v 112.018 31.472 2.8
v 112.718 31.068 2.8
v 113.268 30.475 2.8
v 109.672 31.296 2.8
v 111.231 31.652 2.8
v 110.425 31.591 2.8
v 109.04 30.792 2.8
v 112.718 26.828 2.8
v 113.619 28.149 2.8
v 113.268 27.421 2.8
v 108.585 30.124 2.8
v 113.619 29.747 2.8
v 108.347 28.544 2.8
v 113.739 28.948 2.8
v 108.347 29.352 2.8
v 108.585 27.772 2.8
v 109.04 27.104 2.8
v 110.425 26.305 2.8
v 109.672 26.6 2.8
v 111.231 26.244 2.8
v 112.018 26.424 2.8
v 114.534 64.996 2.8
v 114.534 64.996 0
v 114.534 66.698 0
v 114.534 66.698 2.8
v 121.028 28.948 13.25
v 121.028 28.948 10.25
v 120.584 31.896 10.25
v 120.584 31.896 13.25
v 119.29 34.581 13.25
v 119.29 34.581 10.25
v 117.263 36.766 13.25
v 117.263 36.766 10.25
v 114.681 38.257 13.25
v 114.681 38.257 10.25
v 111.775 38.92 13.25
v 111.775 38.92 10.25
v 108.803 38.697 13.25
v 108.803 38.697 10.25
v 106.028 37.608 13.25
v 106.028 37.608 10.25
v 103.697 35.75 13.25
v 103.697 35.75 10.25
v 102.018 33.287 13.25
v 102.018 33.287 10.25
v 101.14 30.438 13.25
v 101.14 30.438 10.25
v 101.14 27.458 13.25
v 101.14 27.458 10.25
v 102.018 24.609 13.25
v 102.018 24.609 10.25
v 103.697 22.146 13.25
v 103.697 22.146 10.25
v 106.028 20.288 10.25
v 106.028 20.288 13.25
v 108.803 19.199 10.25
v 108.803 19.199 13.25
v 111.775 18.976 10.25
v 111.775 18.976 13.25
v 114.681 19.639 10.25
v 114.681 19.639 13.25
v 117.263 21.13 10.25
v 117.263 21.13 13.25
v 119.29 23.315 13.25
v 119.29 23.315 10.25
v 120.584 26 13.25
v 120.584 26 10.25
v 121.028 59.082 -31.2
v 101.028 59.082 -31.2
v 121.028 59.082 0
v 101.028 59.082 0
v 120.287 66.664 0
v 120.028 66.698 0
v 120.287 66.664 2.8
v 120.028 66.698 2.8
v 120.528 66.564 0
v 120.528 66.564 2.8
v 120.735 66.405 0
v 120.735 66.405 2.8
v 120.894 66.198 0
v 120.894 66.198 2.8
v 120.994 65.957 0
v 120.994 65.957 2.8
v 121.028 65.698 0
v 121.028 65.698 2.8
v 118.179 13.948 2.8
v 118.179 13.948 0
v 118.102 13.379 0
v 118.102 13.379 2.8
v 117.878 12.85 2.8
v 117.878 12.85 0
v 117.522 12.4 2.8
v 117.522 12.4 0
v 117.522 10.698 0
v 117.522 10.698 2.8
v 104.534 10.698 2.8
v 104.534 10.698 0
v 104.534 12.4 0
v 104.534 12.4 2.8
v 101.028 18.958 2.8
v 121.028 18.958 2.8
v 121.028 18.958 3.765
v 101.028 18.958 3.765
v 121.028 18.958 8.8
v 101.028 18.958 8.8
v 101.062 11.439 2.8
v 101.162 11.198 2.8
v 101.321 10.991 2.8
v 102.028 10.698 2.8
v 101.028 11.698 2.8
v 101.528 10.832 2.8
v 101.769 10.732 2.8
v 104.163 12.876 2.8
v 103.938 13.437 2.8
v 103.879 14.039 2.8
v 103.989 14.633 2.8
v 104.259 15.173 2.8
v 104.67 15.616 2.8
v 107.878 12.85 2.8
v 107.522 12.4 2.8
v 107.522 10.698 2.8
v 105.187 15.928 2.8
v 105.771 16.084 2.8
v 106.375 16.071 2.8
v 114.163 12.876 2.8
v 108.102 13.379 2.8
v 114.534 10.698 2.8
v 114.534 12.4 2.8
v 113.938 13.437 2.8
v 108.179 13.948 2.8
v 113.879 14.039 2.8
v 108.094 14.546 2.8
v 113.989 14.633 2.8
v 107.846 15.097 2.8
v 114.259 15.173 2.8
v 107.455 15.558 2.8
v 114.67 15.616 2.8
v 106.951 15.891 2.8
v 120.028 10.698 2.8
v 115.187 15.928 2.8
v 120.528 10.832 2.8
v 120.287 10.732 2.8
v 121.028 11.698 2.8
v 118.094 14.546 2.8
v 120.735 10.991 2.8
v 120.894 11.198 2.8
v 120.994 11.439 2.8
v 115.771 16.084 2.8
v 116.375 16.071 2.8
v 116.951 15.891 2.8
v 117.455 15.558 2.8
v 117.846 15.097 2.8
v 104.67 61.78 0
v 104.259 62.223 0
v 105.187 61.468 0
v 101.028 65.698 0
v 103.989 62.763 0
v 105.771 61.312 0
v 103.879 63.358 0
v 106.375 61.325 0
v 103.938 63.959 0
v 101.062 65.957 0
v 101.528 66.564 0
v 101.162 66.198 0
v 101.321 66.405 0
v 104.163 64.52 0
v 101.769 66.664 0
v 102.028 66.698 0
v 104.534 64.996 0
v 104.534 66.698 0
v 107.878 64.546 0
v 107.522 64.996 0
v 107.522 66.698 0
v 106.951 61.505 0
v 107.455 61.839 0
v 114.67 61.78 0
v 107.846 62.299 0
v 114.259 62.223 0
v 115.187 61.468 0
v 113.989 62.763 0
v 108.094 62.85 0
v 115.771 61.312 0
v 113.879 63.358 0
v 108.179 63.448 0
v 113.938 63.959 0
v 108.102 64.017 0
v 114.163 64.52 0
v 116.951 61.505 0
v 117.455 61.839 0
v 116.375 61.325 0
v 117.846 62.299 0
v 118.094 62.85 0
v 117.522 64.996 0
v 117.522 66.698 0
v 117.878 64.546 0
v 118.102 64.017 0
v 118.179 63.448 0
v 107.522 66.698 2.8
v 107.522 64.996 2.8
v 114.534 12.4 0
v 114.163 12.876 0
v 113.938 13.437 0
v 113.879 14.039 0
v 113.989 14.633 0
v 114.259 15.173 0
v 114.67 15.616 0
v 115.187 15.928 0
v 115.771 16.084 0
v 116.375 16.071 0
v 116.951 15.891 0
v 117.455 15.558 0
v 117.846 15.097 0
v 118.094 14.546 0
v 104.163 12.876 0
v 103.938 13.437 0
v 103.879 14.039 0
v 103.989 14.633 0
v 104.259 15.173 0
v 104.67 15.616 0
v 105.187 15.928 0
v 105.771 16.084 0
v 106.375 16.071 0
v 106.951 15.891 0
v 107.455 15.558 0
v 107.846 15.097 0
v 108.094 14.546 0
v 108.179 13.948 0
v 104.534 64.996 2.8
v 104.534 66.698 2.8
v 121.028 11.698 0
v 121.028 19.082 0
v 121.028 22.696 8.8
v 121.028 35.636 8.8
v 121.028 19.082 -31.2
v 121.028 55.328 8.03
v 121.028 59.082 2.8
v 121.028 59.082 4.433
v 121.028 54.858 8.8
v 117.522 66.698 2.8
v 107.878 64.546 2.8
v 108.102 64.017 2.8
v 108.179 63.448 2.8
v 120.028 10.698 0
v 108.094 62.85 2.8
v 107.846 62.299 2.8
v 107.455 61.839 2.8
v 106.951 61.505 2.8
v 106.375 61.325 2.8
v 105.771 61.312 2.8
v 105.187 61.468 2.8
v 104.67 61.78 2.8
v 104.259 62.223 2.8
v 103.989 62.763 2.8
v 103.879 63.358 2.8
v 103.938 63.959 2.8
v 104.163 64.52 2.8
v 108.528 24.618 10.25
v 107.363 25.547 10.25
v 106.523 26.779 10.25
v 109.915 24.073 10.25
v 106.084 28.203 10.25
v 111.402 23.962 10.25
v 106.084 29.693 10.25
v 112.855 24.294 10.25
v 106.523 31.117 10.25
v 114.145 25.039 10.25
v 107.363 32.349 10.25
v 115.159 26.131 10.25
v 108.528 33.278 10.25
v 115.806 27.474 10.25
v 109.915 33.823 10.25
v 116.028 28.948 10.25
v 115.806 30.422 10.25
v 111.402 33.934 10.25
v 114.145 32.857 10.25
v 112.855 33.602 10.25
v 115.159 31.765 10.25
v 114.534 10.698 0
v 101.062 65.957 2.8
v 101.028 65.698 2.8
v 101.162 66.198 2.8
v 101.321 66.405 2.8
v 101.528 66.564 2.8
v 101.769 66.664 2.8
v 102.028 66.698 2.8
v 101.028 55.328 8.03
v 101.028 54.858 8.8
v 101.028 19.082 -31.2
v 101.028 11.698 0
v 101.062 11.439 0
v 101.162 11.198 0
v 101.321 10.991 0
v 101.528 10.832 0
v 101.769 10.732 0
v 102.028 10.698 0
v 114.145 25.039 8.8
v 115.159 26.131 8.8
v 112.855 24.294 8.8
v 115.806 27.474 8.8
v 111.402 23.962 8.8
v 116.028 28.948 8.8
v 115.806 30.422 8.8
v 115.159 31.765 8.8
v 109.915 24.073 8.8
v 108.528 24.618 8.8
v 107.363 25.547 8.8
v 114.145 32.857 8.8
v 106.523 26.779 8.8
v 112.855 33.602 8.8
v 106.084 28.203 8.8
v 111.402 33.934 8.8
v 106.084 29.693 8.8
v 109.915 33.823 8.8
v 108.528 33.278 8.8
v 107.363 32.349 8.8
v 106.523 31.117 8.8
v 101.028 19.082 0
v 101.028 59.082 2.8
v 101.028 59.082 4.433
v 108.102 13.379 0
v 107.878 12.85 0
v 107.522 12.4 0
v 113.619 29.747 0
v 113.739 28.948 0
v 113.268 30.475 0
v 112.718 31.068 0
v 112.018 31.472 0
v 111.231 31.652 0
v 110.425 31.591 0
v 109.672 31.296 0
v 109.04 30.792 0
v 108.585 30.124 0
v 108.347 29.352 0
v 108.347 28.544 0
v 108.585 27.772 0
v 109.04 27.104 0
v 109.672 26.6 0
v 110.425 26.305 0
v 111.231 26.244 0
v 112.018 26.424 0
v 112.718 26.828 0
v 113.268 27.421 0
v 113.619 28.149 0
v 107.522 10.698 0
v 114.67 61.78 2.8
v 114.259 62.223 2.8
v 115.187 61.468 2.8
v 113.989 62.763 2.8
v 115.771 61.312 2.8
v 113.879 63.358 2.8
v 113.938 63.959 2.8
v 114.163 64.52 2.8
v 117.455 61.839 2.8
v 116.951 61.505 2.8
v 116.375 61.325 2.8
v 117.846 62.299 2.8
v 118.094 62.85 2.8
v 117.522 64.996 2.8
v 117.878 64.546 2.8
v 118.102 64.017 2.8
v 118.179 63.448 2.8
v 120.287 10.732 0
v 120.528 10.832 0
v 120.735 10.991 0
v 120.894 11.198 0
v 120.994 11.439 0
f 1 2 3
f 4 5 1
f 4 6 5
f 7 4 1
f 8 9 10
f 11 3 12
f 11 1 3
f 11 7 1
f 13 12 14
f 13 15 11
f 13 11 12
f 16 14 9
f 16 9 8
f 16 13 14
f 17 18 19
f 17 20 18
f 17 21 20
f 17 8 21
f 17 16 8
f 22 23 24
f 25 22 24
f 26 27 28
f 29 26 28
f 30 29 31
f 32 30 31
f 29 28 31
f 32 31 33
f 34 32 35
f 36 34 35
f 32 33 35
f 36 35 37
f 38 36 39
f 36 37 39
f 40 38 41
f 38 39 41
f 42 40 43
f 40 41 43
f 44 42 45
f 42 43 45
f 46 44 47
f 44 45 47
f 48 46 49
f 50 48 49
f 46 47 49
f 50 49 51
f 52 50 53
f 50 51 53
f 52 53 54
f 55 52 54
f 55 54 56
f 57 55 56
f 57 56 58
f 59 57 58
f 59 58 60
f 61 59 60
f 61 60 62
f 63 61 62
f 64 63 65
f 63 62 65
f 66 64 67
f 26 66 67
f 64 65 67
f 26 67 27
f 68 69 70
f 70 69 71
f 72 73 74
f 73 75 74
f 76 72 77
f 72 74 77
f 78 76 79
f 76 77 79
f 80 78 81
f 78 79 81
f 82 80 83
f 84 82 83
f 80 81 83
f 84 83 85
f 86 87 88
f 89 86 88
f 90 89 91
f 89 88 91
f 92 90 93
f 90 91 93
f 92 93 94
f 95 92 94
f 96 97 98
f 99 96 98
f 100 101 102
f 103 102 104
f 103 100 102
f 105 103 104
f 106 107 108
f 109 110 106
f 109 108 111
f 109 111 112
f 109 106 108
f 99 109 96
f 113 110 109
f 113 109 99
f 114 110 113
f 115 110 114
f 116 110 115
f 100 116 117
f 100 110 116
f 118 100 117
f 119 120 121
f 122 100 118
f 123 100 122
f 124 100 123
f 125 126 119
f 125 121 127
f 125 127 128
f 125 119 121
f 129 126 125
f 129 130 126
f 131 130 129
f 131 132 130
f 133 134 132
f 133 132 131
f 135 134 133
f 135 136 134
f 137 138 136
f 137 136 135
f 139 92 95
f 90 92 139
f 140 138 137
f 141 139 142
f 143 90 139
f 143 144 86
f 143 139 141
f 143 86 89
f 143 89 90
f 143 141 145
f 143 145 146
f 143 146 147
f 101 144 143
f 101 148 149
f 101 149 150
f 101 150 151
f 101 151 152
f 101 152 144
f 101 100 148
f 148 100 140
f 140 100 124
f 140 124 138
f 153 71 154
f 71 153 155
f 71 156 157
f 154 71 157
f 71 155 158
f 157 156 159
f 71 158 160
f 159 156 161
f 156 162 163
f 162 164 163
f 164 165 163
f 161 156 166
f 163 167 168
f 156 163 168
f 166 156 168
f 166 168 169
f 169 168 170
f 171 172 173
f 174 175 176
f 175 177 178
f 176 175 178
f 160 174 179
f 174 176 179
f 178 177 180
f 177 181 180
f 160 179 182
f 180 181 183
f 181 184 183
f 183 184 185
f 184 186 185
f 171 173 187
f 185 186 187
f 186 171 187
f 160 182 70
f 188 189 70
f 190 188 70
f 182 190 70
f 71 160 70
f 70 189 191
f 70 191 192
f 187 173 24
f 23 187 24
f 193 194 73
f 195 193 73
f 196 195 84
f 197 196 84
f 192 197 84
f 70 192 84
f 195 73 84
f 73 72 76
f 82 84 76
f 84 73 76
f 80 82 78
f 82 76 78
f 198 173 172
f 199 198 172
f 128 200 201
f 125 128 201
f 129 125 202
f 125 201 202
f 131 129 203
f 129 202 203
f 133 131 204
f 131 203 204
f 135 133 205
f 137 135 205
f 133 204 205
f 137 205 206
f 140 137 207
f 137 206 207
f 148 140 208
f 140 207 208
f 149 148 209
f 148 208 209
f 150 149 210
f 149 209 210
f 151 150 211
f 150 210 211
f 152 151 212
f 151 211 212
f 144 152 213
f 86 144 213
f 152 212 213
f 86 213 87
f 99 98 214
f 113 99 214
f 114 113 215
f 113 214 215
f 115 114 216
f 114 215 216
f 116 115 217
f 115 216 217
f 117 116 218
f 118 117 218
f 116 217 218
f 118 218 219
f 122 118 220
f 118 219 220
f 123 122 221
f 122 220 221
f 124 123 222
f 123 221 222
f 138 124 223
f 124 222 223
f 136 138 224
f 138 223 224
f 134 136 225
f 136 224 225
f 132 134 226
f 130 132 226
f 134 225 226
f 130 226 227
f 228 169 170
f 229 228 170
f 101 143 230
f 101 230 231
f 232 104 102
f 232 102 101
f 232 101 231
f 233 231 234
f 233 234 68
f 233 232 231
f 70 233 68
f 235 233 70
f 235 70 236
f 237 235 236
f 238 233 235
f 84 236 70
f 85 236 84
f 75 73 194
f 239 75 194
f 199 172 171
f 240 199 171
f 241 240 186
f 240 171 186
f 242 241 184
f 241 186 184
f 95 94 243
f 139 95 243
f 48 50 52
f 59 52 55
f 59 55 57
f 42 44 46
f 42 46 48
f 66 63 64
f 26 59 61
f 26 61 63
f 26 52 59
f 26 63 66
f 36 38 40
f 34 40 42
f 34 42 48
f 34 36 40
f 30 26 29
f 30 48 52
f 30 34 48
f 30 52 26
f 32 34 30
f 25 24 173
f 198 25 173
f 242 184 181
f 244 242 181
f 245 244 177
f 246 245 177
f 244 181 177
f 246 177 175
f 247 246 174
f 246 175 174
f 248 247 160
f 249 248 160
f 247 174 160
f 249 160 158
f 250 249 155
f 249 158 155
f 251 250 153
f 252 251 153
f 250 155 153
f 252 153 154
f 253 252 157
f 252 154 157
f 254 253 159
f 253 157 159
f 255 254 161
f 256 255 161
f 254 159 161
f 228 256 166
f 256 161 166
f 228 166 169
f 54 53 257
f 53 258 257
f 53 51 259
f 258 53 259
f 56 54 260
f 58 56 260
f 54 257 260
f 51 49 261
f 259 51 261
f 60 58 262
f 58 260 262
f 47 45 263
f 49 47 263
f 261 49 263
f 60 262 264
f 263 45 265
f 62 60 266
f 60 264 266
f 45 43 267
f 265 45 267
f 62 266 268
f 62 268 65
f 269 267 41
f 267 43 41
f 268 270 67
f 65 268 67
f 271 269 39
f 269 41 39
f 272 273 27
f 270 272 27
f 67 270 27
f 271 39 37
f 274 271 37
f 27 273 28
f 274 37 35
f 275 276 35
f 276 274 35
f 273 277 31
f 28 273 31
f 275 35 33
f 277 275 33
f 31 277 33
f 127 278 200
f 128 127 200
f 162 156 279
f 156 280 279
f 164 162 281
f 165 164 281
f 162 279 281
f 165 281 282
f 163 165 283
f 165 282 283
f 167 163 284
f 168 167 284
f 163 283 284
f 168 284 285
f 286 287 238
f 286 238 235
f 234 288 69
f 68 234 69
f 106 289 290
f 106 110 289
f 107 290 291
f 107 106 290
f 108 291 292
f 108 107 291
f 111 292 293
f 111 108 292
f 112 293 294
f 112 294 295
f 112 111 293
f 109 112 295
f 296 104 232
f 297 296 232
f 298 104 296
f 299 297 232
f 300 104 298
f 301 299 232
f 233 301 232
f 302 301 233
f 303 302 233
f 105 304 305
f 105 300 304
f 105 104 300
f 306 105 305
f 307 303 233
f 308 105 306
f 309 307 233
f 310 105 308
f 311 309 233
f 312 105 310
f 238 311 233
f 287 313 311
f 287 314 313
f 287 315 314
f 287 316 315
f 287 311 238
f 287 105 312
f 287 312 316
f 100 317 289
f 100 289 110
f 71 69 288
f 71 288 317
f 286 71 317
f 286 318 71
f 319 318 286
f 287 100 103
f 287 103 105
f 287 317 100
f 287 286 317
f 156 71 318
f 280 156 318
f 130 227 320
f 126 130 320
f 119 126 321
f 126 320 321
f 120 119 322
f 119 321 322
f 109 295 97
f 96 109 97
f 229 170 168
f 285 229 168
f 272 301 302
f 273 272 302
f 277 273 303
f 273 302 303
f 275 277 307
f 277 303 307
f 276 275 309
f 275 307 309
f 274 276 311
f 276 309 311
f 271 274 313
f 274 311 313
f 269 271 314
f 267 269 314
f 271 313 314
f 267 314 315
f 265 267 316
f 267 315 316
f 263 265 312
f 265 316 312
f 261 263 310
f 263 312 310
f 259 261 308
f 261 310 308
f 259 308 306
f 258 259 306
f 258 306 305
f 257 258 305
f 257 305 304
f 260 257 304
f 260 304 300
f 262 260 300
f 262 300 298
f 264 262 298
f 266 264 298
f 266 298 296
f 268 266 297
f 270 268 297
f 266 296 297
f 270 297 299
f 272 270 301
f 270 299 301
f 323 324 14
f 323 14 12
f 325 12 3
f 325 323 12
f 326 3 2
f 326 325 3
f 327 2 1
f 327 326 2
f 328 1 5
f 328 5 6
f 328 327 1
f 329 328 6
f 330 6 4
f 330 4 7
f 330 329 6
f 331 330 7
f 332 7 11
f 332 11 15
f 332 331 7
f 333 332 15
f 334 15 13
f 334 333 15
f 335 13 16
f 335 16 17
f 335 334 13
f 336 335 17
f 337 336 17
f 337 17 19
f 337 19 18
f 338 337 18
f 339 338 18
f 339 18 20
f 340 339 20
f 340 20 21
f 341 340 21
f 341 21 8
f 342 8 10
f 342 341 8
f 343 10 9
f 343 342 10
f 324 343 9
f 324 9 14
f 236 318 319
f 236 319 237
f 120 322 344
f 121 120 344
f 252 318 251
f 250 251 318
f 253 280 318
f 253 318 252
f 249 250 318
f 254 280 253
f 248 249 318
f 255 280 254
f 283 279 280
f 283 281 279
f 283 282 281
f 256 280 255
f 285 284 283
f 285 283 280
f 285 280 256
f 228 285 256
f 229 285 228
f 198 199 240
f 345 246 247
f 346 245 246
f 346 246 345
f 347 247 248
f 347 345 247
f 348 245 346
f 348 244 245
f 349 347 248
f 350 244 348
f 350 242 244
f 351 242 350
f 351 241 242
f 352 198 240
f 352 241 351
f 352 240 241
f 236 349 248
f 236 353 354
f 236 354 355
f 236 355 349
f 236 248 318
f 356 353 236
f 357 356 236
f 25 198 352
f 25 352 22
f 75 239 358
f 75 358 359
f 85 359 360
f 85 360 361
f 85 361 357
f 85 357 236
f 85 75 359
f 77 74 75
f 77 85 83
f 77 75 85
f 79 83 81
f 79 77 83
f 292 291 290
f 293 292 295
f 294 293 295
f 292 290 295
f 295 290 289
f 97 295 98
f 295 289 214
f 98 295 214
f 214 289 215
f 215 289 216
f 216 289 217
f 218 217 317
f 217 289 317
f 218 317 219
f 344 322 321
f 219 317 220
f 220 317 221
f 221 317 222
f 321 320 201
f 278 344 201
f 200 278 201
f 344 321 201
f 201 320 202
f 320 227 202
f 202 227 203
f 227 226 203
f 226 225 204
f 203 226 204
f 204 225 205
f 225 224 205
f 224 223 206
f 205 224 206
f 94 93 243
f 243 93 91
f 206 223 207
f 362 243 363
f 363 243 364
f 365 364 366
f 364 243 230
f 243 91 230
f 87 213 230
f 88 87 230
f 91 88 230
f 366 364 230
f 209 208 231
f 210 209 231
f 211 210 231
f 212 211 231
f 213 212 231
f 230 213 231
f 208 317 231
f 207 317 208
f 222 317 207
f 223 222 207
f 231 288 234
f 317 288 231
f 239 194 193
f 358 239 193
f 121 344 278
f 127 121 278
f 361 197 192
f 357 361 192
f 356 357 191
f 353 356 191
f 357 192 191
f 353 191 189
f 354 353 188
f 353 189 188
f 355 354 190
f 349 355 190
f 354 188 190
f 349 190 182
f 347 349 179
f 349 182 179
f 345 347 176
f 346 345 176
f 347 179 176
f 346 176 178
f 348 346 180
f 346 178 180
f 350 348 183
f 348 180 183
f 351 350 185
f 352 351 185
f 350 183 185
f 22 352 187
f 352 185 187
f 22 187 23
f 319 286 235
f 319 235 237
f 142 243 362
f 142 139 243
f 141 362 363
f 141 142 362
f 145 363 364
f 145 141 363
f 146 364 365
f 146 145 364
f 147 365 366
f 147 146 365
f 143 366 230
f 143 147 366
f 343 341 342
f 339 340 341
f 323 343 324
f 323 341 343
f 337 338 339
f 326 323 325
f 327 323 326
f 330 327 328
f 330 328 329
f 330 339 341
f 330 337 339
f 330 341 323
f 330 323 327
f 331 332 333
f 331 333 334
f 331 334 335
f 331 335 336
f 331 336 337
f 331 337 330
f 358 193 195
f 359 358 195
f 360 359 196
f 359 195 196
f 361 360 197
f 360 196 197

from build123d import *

# Parameters (mm, degrees)
SKETCH1_R           = 2.71138536
BOSS_EXTRUDE2_DEPTH = 2.8
FILLET1_R           = 1
BOSS_EXTRUDE4_REACH = 71.688
SKETCH5_W           = 31.2
SKETCH5_H           = 40
CUT_EXTRUDE1_DEPTH  = 143.310868606
SKETCH7_W           = 29.686403428
SKETCH7_H           = 9.387658688
SKETCH7_W_2         = 27.535306267
SKETCH7_H_2         = 10.174748845
CUT_EXTRUDE2_DEPTH  = 143.310868606
SKETCH9_R           = 3.527564699
BOSS_EXTRUDE5_DEPTH = 4.45
SKETCH8_W           = 7.436989159
SKETCH8_H           = 16.512703909
CUT_EXTRUDE4_DEPTH  = 77.302474202
SKETCH11_R          = 5
BOSS_EXTRUDE6_DEPTH = 1.45
SKETCH12_R          = 10
BOSS_EXTRUDE7_DEPTH = 3


with BuildPart() as part:
    # Sketch1 → Boss-Extrude2 (new body)
    with BuildSketch(Plane.XY):
        with BuildLine():
            Line((101.027913119, 66.698032725), (101.027913119, 10.698032725))
            Line((101.027913119, 10.698032725), (104.53416083, 10.698032725))
            Line((104.53416083, 10.698032725), (104.53416083, 12.400036101))
            ThreePointArc((104.53416083, 12.400036101), (105.187004527, 15.928048429), (108.179096386, 13.948032725))
            ThreePointArc((108.179096386, 13.948032725), (108.007928823, 13.107124133), (107.521665407, 12.400036101))
            Line((107.521665407, 12.400036101), (107.521665407, 10.698032725))
            Line((107.521665407, 10.698032725), (114.53416083, 10.698032725))
            Line((114.53416083, 10.698032725), (114.53416083, 12.400036101))
            ThreePointArc((114.53416083, 12.400036101), (115.187004527, 15.928048429), (118.179096386, 13.948032725))
            ThreePointArc((118.179096386, 13.948032725), (118.007928823, 13.107124133), (117.521665407, 12.400036101))
            Line((117.521665407, 12.400036101), (117.521665407, 10.698032725))
            Line((117.521665407, 10.698032725), (121.027913119, 10.698032725))
            Line((121.027913119, 10.698032725), (121.027913119, 66.698032725))
            Line((121.027913119, 66.698032725), (117.521665407, 66.698032725))
            Line((117.521665407, 66.698032725), (117.521665407, 64.996029349))
            ThreePointArc((117.521665407, 64.996029349), (118.007928823, 64.288941317), (118.179096386, 63.448032725))
            ThreePointArc((118.179096386, 63.448032725), (115.187004527, 61.468017021), (114.53416083, 64.996029349))
            Line((114.53416083, 64.996029349), (114.53416083, 66.698032725))
            Line((114.53416083, 66.698032725), (107.521665407, 66.698032725))
            Line((107.521665407, 66.698032725), (107.521665407, 64.996029349))
            ThreePointArc((107.521665407, 64.996029349), (108.007928823, 64.288941317), (108.179096386, 63.448032725))
            ThreePointArc((108.179096386, 63.448032725), (105.187004527, 61.468017021), (104.53416083, 64.996029349))
            Line((104.53416083, 64.996029349), (104.53416083, 66.698032725))
            Line((104.53416083, 66.698032725), (101.027913119, 66.698032725))
        make_face()
        with Locations((111.027913119, 28.948032725)):
            Circle(SKETCH1_R, mode=Mode.SUBTRACT)
    extrude(amount=BOSS_EXTRUDE2_DEPTH)

    # Fillet1
    fillet1_edges = [part.edges().sort_by_distance(p)[0] for p in [
        (101.027913119, 10.698032725, 1.4),
        (101.027913119, 66.698032725, 1.4),
        (121.027913119, 66.698032725, 1.4),
        (121.027913119, 10.698032725, 1.4),
    ]]
    fillet(fillet1_edges, radius=FILLET1_R)

    # Boss-Extrude4: up to this face of the body (flat: up to its plane)
    boss_extrude4_end = Plane(part.part.faces().sort_by_distance((121.027913119, 38.698032725, 1.4))[0])
    # Sketch5 → Boss-Extrude4 (add, up to the picked face)
    with BuildSketch(Plane.ZY.offset(-101.027913119), mode=Mode.PRIVATE) as boss_extrude4_sk1:
        Polygon((4.36856715, 64.103331084), (2.8, 64.103331084), (2.8, 13.685897531), (3.764993714, 13.685897531), (3.764993714, 18.958103522), (8.8, 18.958103522), (8.8, 22.695834212), (9.718562106, 23.589991727), (9.718562106, 25.946850167), (13.25, 25.946850167), (13.25, 32.391247199), (9.718562106, 32.391247199), (9.718562106, 35.074245433), (8.8, 35.635588942), (8.8, 54.857740136), (8.029983718, 55.328305642), (4.432571629, 59.081605588), (4.36856715, 59.081605588), align=None)
    boss_extrude4_tool1 = split(extrude(boss_extrude4_sk1.sketch, amount=-BOSS_EXTRUDE4_REACH, mode=Mode.PRIVATE), bisect_by=boss_extrude4_end, keep=Keep.BOTH, mode=Mode.PRIVATE)
    # Sketch5 → Boss-Extrude4 (add, up to the picked face)
    with BuildSketch(Plane.ZY.offset(-101.027913119), mode=Mode.PRIVATE) as boss_extrude4_sk2:
        with Locations((-15.6, 39.081605588)):
            Rectangle(SKETCH5_W, SKETCH5_H)
    boss_extrude4_tool2 = split(extrude(boss_extrude4_sk2.sketch, amount=-BOSS_EXTRUDE4_REACH, mode=Mode.PRIVATE), bisect_by=boss_extrude4_end, keep=Keep.BOTH, mode=Mode.PRIVATE)
    add(boss_extrude4_tool1.solids().sort_by(Axis((101.027913, 37.386075, 6.241915), (1, 0, 0)))[0])
    add(boss_extrude4_tool2.solids().sort_by(Axis((101.027913, 39.081606, -15.6), (1, 0, 0)))[0])

    # Sketch6 → Cut-Extrude1 (cut, through all)
    with BuildSketch(Plane(origin=(0, 0, 2.8), x_dir=(-1, 0, 0), z_dir=(0, 0, -1))):
        with BuildLine():
            Line((-113.978968632, 64.103331084), (-118.076857605, 64.103331084))
            ThreePointArc((-118.076857605, 64.103331084), (-116.027913119, 61.296849458), (-113.978968632, 64.103331084))
        make_face()
        with BuildLine():
            Line((-103.978968632, 64.103331084), (-108.076857605, 64.103331084))
            ThreePointArc((-108.076857605, 64.103331084), (-106.027913119, 61.296849458), (-103.978968632, 64.103331084))
        make_face()
        with BuildLine():
            Line((-118.163065242, 13.685897531), (-113.892760996, 13.685897531))
            ThreePointArc((-113.892760996, 13.685897531), (-116.027913119, 16.099215992), (-118.163065242, 13.685897531))
        make_face()
        with BuildLine():
            Line((-108.163065242, 13.685897531), (-103.892760996, 13.685897531))
            ThreePointArc((-103.892760996, 13.685897531), (-106.027913119, 16.099215992), (-108.163065242, 13.685897531))
        make_face()
    extrude(amount=-CUT_EXTRUDE1_DEPTH, mode=Mode.SUBTRACT)

    # Sketch7 → Cut-Extrude2 (cut, through all)
    with BuildSketch(Plane.XY.offset(2.8)):
        with Locations((110.258958877, 63.775434932)):
            Rectangle(SKETCH7_W, SKETCH7_H)
        with Locations((111.334507458, 13.8707291)):
            Rectangle(SKETCH7_W_2, SKETCH7_H_2)
    extrude(amount=CUT_EXTRUDE2_DEPTH, mode=Mode.SUBTRACT)

    # Sketch8 → Cut-Extrude4 (cut, through all)
    with BuildSketch(Plane.ZY.offset(-101.027913119)):
        with Locations((12.51849458, 29.114960016)):
            Rectangle(SKETCH8_W, SKETCH8_H)
    extrude(amount=-CUT_EXTRUDE4_DEPTH, mode=Mode.SUBTRACT)



with BuildPart() as body_2:
    # Sketch9 → Boss-Extrude5 (new, through all)
    with BuildSketch(Plane.XY.offset(8.8)):
        with Locations((111.027913119, 28.948032725)):
            Circle(SKETCH9_R)
    extrude(amount=BOSS_EXTRUDE5_DEPTH)


with BuildPart() as part_1:
    add(part.part)

    add(body_2.part)  # Boss-Extrude6 merges body 2
    # Sketch11 → Boss-Extrude6 (add)
    with BuildSketch(Plane.XY.offset(8.8)):
        with Locations((111.027913119, 28.948032725)):
            Circle(SKETCH11_R)
    extrude(amount=BOSS_EXTRUDE6_DEPTH)

    # Sketch12 → Boss-Extrude7 (add)
    with BuildSketch(Plane.XY.offset(10.25)):
        with Locations((111.027913119, 28.948032725)):
            Circle(SKETCH12_R)
    extrude(amount=BOSS_EXTRUDE7_DEPTH)


solid = part_1.part
